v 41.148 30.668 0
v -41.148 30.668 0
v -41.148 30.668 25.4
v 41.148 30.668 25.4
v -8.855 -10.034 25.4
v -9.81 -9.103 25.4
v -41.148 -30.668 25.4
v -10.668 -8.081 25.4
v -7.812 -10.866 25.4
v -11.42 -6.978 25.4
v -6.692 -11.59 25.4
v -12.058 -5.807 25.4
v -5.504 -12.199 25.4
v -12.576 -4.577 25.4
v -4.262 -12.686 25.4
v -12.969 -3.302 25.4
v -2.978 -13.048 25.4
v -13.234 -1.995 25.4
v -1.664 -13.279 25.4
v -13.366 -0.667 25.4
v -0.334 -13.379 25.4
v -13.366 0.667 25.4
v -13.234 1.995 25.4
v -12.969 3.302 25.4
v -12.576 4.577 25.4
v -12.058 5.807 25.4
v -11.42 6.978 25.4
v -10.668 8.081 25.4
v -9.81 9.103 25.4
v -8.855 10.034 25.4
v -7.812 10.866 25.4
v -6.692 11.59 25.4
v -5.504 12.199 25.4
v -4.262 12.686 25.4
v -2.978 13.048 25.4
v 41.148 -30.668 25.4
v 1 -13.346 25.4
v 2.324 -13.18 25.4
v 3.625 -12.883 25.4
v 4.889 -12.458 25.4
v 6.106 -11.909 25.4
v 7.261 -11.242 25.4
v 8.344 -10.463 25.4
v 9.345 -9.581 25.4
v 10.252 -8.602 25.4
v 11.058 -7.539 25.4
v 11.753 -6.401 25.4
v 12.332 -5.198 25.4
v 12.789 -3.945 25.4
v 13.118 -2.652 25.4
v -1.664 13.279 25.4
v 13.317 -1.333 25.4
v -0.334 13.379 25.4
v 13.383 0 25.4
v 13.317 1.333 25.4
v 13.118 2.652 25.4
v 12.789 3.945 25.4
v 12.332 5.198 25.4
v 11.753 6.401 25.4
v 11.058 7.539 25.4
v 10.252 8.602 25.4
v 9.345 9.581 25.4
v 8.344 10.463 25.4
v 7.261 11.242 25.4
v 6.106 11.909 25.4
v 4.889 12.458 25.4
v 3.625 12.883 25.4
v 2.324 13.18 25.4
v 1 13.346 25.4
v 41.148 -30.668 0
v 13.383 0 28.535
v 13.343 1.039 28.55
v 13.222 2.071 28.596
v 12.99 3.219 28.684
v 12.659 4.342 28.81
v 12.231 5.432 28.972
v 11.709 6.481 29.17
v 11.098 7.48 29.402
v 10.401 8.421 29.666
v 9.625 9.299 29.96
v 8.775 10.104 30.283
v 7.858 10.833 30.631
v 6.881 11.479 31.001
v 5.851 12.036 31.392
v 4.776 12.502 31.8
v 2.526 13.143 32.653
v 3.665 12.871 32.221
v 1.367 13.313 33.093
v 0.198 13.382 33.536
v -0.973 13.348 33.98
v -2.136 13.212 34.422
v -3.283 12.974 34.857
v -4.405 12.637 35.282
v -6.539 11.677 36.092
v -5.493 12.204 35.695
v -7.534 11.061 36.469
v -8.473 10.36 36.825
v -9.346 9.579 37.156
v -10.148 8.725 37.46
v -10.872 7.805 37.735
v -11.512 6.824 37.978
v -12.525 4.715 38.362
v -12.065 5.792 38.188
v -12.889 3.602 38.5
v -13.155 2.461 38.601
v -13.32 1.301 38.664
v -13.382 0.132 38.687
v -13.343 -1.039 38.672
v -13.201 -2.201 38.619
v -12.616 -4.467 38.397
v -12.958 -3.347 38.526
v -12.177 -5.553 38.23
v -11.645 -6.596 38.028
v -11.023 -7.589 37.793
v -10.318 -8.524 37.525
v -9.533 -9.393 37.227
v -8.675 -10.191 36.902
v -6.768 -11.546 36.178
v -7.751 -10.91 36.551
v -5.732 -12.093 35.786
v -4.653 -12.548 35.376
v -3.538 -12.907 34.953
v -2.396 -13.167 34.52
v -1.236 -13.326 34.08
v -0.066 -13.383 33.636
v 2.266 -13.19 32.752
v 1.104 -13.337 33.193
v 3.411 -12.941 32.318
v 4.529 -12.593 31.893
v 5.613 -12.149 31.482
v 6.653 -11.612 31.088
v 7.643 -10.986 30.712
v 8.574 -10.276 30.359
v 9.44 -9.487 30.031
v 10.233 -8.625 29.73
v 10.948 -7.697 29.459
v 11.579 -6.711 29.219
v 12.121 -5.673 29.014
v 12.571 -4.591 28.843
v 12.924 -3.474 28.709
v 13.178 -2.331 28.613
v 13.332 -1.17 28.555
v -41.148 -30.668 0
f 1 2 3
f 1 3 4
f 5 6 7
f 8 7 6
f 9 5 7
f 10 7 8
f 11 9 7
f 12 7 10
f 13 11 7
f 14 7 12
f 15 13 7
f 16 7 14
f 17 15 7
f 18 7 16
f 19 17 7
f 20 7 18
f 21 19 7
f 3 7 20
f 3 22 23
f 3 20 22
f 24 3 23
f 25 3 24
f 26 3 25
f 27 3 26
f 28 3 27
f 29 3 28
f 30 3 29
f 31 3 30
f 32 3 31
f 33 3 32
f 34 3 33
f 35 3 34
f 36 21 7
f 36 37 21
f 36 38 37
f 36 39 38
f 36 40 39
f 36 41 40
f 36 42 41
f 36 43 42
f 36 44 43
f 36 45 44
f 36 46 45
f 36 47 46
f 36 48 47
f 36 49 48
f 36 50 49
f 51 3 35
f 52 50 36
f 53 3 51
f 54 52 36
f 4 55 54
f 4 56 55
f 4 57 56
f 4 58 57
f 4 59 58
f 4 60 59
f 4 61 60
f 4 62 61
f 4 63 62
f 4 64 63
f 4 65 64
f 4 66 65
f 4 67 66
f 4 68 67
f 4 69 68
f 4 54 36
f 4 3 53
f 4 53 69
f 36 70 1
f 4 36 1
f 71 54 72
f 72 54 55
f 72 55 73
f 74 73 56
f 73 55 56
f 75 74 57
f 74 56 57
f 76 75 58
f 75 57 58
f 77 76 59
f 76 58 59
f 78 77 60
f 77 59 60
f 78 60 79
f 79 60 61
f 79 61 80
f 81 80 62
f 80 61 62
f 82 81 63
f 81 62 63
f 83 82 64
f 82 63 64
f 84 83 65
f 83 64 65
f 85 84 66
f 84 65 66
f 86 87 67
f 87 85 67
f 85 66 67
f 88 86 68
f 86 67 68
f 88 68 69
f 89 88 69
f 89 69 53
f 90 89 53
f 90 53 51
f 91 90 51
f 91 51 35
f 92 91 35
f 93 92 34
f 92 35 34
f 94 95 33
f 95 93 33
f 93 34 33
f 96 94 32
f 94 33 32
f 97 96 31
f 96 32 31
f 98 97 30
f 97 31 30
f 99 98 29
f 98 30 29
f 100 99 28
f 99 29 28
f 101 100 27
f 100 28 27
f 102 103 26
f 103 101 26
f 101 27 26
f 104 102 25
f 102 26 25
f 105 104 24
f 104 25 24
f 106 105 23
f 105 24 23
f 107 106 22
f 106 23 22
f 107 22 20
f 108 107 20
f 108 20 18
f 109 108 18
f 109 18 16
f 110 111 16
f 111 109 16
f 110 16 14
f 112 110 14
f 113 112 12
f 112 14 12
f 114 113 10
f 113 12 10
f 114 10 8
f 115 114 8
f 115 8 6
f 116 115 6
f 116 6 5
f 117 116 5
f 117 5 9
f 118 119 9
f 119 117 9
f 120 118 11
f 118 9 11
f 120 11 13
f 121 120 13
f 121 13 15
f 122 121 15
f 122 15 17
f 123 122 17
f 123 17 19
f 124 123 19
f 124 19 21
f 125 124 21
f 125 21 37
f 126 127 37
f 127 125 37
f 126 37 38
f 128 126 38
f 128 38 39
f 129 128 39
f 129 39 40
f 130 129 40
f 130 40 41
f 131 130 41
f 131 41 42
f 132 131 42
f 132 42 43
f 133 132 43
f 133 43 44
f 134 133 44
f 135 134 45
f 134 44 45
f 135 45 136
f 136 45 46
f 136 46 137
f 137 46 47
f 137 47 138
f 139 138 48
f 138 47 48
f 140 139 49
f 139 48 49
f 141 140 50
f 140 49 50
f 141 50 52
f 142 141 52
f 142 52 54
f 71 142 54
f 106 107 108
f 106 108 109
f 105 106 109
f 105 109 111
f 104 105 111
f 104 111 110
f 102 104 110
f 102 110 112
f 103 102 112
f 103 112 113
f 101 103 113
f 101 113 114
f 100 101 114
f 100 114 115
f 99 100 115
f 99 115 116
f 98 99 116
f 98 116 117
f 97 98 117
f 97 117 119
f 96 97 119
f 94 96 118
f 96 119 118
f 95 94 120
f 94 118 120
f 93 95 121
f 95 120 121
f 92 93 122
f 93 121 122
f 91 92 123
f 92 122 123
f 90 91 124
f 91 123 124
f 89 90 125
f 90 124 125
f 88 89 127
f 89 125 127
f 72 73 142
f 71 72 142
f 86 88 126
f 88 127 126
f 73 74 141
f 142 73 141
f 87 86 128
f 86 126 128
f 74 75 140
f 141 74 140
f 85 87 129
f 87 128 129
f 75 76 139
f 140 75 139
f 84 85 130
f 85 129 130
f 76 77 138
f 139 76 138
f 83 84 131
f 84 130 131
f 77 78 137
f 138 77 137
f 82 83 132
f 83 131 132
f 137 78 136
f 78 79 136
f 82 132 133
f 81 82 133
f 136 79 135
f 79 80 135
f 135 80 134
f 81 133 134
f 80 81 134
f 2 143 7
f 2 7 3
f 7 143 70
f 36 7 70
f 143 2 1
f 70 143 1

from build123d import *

# Parameters (mm, degrees)
F0_W     = 82.296788
F0_H     = 61.336212
F1_DEPTH = 25.4
F2_R     = 13.383079
F3_DEPTH = 14.986
F5_DEPTH = 25.4


with BuildPart() as f1:
    # F0 (on Top) → F1 (new body)
    with BuildSketch(Plane.XY):
        Rectangle(F0_W, F0_H)
    extrude(amount=F1_DEPTH)

    # F2 (on face) → F3 (join)
    with BuildSketch(Plane.XY.offset(25.4)):
        Circle(F2_R)
    extrude(amount=F3_DEPTH)

    # F4 (on Front) → F5 (cut, symmetric)
    with BuildSketch(Plane.XZ):
        Polygon((18.06845, 41.92983), (-21.930402, 41.92983), (18.06845, 26.757853), align=None)
    extrude(amount=F5_DEPTH, both=True, mode=Mode.SUBTRACT)


solid = f1.part
